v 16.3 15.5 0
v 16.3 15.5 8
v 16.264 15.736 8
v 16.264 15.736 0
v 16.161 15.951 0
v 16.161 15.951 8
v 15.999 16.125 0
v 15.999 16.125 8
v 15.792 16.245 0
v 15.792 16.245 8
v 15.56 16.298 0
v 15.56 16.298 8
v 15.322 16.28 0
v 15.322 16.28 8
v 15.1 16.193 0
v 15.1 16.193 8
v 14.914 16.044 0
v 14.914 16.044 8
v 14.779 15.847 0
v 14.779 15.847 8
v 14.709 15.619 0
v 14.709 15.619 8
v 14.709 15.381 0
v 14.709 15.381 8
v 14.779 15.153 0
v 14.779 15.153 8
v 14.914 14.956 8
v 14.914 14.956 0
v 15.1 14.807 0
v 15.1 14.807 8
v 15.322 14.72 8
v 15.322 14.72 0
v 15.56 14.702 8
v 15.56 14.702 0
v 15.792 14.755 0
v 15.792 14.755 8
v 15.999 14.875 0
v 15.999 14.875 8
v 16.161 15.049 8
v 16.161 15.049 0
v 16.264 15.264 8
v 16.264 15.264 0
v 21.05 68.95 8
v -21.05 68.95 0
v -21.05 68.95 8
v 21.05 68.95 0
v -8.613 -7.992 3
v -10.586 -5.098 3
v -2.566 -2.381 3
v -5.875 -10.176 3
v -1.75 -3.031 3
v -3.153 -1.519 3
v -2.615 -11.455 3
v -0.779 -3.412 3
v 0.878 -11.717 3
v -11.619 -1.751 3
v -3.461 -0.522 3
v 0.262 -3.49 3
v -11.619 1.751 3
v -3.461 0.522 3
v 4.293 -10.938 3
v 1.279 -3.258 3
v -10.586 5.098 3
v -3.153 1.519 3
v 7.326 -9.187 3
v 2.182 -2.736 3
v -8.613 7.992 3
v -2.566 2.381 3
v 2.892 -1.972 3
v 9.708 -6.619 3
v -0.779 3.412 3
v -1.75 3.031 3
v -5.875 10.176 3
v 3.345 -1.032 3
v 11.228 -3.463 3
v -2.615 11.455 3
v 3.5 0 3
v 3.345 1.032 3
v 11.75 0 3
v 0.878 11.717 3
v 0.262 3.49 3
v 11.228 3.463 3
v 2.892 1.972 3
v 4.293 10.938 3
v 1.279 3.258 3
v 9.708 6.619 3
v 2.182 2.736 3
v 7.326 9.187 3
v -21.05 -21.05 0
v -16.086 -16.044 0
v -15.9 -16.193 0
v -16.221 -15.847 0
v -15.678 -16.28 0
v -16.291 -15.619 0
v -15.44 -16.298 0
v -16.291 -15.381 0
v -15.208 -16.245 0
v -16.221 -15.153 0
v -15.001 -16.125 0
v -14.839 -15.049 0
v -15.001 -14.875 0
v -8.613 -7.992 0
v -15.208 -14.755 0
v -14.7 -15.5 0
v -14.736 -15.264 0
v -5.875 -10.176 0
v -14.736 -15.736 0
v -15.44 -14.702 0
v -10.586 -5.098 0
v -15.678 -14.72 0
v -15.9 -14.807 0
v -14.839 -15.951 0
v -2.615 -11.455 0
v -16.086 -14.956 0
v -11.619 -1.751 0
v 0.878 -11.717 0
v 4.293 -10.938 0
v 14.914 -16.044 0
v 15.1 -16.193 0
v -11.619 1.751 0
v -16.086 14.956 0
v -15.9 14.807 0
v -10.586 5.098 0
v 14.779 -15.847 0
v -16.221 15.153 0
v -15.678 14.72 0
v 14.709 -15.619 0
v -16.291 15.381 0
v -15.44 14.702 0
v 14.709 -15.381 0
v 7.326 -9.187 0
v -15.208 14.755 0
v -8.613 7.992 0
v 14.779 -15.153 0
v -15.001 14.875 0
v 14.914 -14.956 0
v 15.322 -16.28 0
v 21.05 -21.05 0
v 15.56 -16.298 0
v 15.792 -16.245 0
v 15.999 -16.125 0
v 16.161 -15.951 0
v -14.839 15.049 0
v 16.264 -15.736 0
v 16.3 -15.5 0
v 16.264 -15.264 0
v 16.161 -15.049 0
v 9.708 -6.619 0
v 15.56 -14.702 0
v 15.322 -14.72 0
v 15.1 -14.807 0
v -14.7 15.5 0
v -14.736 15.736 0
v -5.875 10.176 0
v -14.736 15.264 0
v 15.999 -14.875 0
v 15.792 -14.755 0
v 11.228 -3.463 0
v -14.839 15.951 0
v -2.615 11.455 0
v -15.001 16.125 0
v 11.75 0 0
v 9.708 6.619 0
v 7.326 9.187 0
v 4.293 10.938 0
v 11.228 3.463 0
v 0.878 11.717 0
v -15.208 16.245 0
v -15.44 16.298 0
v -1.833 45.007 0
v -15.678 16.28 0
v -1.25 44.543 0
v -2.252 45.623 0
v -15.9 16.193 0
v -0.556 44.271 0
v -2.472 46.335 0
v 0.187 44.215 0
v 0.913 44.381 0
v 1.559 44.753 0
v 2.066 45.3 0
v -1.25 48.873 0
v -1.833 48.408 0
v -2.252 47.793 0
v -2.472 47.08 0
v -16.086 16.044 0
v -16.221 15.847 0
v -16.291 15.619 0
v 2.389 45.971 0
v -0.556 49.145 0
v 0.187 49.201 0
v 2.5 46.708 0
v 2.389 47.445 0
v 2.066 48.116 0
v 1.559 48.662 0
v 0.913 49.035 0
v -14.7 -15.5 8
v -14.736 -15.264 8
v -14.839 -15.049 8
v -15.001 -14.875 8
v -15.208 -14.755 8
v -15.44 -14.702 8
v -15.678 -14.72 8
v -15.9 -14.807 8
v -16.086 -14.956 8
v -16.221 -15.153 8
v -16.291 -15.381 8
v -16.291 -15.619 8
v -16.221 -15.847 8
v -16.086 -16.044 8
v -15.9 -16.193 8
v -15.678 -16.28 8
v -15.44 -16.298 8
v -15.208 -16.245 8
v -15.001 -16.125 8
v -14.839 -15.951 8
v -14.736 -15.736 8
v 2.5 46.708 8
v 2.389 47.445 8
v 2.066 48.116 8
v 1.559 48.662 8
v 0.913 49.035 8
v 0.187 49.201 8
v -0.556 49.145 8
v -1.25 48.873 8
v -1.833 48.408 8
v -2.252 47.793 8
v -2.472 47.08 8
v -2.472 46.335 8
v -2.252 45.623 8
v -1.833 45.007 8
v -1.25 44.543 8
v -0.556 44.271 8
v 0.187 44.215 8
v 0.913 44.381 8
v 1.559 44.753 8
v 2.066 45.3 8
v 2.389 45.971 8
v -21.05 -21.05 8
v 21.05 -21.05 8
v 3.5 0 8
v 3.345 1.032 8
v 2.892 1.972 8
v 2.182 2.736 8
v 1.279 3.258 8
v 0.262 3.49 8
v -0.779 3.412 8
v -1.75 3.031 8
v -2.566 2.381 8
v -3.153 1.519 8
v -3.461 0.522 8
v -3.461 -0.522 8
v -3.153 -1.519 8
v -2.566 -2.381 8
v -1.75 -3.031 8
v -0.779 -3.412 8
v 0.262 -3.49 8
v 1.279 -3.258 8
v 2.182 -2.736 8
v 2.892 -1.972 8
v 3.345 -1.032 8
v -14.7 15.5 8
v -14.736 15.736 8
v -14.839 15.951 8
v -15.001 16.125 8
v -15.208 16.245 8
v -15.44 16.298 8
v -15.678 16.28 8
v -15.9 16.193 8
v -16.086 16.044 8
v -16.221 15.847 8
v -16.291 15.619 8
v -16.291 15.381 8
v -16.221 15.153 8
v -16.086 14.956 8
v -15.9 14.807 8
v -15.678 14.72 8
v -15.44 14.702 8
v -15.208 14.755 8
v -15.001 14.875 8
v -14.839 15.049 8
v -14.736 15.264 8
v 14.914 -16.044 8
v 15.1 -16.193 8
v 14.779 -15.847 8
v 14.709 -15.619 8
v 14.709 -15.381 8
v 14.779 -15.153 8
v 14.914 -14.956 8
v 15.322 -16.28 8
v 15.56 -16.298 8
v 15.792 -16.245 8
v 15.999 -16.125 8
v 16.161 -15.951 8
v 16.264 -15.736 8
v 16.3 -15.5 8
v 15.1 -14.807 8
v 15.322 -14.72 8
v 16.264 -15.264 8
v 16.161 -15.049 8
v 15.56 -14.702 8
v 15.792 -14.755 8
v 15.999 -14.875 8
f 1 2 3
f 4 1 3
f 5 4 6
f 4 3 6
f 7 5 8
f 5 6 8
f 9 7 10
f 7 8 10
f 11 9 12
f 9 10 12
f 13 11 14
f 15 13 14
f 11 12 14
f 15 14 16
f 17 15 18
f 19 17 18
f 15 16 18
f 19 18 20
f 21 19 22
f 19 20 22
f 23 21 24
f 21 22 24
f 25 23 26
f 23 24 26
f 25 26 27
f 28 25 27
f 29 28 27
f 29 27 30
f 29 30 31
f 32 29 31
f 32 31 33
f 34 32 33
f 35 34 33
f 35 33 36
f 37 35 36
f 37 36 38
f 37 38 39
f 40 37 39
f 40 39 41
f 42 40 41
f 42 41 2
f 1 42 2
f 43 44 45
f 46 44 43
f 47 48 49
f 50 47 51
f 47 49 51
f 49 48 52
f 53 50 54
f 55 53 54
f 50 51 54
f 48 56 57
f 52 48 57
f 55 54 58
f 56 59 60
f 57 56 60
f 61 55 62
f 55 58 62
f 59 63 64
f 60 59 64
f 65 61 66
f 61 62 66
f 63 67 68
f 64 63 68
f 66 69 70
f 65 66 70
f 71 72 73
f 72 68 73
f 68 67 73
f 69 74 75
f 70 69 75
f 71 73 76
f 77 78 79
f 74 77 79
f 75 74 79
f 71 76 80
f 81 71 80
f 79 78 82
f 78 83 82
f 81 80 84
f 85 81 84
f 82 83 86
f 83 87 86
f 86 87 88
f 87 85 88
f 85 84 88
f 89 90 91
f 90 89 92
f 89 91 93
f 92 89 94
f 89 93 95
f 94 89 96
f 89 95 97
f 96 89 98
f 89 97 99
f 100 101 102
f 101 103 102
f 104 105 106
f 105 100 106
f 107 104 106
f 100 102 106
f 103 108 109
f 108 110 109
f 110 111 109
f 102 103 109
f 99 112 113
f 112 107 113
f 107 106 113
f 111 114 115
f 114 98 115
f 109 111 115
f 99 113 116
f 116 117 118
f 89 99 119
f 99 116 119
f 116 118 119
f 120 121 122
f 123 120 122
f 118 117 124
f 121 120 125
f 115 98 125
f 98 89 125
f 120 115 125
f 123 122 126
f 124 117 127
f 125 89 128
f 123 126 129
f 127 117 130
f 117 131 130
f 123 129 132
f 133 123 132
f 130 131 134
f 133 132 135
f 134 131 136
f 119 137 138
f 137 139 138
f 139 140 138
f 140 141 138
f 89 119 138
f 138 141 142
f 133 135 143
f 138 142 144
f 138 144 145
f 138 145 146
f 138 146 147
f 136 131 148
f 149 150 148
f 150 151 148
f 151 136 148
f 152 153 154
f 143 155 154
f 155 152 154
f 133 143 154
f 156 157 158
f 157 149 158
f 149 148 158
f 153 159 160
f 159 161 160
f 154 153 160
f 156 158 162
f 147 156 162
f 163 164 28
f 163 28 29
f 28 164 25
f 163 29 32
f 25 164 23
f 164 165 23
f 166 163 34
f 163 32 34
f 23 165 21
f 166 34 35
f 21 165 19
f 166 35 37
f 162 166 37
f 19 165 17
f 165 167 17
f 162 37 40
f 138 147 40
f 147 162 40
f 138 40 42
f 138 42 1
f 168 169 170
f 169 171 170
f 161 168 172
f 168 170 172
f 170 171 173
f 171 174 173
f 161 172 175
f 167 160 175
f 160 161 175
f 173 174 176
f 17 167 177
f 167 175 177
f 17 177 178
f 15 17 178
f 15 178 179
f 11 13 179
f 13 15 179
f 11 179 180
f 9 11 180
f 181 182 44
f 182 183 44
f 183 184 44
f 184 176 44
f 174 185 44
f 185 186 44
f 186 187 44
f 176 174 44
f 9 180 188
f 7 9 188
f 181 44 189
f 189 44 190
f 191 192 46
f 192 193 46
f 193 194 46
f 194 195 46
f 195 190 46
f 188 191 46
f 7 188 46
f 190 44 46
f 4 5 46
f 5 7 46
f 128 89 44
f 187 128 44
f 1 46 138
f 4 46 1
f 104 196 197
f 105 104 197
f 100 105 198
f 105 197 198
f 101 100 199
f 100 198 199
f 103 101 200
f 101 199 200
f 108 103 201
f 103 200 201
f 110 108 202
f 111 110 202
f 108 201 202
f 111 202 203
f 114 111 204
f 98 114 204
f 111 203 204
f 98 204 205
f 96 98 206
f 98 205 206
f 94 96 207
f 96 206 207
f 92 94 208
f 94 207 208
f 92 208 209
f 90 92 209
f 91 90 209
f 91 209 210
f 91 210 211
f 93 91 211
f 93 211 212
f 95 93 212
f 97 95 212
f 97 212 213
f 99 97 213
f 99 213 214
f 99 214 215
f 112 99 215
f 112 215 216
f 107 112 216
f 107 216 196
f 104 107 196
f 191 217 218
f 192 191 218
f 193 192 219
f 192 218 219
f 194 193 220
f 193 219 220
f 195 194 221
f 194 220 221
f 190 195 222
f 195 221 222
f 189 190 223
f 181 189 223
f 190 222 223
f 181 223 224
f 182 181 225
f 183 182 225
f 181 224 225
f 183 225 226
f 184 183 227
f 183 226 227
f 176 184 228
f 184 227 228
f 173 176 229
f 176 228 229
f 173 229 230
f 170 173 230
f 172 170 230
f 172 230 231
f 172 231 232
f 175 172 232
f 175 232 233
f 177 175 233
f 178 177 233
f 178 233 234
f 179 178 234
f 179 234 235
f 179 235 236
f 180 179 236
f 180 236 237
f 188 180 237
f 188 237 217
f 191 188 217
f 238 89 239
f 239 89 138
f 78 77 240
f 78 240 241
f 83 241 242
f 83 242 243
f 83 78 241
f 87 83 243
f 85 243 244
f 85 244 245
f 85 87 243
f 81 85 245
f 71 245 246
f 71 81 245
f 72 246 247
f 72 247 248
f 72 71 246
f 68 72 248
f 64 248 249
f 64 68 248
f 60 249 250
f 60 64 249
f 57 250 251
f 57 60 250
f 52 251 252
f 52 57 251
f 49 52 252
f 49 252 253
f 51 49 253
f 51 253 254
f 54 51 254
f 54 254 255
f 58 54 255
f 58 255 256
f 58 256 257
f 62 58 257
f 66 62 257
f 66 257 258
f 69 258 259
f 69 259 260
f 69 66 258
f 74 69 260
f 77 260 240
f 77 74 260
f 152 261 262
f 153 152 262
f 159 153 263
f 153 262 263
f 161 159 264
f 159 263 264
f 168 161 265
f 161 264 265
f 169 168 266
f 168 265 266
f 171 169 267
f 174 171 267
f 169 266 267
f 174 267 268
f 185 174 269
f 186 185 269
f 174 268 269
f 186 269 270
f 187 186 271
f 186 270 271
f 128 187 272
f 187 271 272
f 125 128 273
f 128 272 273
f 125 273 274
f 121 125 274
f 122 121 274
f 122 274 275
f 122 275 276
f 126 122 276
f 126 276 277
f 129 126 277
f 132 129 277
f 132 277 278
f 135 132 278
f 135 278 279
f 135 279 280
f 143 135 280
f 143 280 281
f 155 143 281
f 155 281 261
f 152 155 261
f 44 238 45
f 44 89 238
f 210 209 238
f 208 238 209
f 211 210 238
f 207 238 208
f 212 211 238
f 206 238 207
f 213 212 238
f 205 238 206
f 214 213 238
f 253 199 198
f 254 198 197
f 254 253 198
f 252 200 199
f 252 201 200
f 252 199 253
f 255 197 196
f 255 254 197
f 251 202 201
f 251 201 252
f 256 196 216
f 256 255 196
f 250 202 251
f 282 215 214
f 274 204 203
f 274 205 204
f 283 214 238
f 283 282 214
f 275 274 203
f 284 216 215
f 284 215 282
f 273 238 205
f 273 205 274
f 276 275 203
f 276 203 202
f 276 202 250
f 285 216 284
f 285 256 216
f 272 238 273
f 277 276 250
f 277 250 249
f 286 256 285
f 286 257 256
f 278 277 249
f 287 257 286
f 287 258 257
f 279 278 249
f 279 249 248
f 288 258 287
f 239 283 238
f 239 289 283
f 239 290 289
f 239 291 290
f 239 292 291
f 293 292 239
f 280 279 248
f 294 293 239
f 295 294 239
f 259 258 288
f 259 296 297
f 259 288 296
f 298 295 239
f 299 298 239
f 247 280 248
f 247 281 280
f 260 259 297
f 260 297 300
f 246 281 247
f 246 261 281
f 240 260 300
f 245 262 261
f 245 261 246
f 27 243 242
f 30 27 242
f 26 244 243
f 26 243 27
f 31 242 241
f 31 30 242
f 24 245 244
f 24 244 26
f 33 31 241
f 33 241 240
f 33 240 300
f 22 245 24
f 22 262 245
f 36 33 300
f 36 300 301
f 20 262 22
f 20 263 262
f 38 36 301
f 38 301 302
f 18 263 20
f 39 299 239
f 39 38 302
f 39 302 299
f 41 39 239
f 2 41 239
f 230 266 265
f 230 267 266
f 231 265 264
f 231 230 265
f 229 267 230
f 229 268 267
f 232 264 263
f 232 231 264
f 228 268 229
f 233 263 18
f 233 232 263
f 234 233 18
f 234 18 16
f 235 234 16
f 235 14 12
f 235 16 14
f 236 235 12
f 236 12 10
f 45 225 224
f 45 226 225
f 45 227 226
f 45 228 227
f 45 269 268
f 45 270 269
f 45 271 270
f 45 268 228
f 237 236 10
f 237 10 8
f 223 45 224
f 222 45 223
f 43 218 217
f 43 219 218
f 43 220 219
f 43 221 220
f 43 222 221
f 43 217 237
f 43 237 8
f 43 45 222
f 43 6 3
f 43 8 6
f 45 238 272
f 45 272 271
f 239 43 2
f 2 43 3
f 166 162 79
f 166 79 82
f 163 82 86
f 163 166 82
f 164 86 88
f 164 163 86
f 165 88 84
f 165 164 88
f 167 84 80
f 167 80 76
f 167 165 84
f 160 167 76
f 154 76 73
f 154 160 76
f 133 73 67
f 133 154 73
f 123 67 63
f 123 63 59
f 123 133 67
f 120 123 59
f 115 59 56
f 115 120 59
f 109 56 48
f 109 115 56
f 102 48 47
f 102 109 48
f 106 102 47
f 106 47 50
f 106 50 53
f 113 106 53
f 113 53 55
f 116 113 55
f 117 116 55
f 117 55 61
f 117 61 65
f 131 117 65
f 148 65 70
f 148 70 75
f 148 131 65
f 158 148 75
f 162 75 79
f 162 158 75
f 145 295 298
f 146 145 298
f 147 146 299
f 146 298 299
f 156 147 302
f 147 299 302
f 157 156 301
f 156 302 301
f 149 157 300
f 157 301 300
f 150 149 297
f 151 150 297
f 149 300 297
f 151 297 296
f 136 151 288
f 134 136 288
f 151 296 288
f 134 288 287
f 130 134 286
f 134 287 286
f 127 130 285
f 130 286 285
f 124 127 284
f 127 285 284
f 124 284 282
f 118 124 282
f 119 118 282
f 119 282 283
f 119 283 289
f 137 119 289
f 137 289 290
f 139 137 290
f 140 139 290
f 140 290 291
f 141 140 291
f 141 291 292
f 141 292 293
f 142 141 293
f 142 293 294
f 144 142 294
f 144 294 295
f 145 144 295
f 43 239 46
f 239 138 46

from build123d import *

# Parameters (mm, degrees)
SKETCH2_W           = 42.1
SKETCH2_H           = 90
SKETCH2_R           = 11.75
BOSS_EXTRUDE1_DEPTH = 3
SKETCH3_W           = 42.1
SKETCH3_H           = 90
SKETCH3_R           = 3.5
BOSS_EXTRUDE2_DEPTH = 5
SKETCH6_R           = 0.8
CUT_EXTRUDE1_DEPTH  = 9
SKETCH7_R           = 2.5
CUT_EXTRUDE2_DEPTH  = 9


with BuildPart() as part:
    # Sketch2 → Boss-Extrude1 (new body)
    with BuildSketch(Plane.XY):
        with Locations((0, 23.95)):
            Rectangle(SKETCH2_W, SKETCH2_H)
        Circle(SKETCH2_R, mode=Mode.SUBTRACT)
    extrude(amount=BOSS_EXTRUDE1_DEPTH)

    # Sketch3 → Boss-Extrude2 (add)
    with BuildSketch(Plane.XY.offset(3)):
        with Locations((0, 23.95)):
            Rectangle(SKETCH3_W, SKETCH3_H)
        Circle(SKETCH3_R, mode=Mode.SUBTRACT)
    extrude(amount=BOSS_EXTRUDE2_DEPTH)

    # Sketch6 → Cut-Extrude1 (cut, through all)
    with BuildSketch(Plane.XY.offset(8)):
        with Locations((-15.5, 15.5)):
            Circle(SKETCH6_R)
        with Locations((-15.5, -15.5)):
            Circle(SKETCH6_R)
        with Locations((15.5, 15.5)):
            Circle(SKETCH6_R)
        with Locations((15.5, -15.5)):
            Circle(SKETCH6_R)
    extrude(amount=-CUT_EXTRUDE1_DEPTH, mode=Mode.SUBTRACT)

    # Sketch7 → Cut-Extrude2 (cut, through all)
    with BuildSketch(Plane.XY.offset(8)):
        with Locations((0, 46.707876994)):
            Circle(SKETCH7_R)
    extrude(amount=-CUT_EXTRUDE2_DEPTH, mode=Mode.SUBTRACT)


solid = part.part
